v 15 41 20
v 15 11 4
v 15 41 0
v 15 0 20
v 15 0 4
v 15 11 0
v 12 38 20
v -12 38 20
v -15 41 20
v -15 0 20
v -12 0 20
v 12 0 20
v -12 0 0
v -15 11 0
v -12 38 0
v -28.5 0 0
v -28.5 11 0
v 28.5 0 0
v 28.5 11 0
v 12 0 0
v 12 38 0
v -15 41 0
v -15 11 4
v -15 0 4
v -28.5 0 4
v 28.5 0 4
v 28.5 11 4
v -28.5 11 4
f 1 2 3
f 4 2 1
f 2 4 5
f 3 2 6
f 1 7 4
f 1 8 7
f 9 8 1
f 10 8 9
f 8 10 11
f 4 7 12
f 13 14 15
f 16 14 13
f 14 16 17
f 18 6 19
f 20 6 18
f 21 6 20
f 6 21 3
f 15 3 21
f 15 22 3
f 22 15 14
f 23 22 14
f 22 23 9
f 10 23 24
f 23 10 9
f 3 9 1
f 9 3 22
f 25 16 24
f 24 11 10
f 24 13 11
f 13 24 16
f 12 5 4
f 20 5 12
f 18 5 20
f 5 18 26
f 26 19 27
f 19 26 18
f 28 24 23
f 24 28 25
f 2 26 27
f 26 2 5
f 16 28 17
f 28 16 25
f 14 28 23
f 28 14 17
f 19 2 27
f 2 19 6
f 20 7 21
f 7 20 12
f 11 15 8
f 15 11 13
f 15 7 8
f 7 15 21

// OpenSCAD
mainbox = [30,41,20];
inbox = [24, 38, 60];
sides = [57,11,4];

difference(){
    union(){
        translate([-mainbox[0]/2,0,0])
        cube(mainbox);
        
        translate([-sides[0]/2,0,0])
        cube(sides);
    }

translate([-inbox[0]/2,-1,-1])
cube([inbox[0],inbox[1]+1,inbox[2]]);
}
